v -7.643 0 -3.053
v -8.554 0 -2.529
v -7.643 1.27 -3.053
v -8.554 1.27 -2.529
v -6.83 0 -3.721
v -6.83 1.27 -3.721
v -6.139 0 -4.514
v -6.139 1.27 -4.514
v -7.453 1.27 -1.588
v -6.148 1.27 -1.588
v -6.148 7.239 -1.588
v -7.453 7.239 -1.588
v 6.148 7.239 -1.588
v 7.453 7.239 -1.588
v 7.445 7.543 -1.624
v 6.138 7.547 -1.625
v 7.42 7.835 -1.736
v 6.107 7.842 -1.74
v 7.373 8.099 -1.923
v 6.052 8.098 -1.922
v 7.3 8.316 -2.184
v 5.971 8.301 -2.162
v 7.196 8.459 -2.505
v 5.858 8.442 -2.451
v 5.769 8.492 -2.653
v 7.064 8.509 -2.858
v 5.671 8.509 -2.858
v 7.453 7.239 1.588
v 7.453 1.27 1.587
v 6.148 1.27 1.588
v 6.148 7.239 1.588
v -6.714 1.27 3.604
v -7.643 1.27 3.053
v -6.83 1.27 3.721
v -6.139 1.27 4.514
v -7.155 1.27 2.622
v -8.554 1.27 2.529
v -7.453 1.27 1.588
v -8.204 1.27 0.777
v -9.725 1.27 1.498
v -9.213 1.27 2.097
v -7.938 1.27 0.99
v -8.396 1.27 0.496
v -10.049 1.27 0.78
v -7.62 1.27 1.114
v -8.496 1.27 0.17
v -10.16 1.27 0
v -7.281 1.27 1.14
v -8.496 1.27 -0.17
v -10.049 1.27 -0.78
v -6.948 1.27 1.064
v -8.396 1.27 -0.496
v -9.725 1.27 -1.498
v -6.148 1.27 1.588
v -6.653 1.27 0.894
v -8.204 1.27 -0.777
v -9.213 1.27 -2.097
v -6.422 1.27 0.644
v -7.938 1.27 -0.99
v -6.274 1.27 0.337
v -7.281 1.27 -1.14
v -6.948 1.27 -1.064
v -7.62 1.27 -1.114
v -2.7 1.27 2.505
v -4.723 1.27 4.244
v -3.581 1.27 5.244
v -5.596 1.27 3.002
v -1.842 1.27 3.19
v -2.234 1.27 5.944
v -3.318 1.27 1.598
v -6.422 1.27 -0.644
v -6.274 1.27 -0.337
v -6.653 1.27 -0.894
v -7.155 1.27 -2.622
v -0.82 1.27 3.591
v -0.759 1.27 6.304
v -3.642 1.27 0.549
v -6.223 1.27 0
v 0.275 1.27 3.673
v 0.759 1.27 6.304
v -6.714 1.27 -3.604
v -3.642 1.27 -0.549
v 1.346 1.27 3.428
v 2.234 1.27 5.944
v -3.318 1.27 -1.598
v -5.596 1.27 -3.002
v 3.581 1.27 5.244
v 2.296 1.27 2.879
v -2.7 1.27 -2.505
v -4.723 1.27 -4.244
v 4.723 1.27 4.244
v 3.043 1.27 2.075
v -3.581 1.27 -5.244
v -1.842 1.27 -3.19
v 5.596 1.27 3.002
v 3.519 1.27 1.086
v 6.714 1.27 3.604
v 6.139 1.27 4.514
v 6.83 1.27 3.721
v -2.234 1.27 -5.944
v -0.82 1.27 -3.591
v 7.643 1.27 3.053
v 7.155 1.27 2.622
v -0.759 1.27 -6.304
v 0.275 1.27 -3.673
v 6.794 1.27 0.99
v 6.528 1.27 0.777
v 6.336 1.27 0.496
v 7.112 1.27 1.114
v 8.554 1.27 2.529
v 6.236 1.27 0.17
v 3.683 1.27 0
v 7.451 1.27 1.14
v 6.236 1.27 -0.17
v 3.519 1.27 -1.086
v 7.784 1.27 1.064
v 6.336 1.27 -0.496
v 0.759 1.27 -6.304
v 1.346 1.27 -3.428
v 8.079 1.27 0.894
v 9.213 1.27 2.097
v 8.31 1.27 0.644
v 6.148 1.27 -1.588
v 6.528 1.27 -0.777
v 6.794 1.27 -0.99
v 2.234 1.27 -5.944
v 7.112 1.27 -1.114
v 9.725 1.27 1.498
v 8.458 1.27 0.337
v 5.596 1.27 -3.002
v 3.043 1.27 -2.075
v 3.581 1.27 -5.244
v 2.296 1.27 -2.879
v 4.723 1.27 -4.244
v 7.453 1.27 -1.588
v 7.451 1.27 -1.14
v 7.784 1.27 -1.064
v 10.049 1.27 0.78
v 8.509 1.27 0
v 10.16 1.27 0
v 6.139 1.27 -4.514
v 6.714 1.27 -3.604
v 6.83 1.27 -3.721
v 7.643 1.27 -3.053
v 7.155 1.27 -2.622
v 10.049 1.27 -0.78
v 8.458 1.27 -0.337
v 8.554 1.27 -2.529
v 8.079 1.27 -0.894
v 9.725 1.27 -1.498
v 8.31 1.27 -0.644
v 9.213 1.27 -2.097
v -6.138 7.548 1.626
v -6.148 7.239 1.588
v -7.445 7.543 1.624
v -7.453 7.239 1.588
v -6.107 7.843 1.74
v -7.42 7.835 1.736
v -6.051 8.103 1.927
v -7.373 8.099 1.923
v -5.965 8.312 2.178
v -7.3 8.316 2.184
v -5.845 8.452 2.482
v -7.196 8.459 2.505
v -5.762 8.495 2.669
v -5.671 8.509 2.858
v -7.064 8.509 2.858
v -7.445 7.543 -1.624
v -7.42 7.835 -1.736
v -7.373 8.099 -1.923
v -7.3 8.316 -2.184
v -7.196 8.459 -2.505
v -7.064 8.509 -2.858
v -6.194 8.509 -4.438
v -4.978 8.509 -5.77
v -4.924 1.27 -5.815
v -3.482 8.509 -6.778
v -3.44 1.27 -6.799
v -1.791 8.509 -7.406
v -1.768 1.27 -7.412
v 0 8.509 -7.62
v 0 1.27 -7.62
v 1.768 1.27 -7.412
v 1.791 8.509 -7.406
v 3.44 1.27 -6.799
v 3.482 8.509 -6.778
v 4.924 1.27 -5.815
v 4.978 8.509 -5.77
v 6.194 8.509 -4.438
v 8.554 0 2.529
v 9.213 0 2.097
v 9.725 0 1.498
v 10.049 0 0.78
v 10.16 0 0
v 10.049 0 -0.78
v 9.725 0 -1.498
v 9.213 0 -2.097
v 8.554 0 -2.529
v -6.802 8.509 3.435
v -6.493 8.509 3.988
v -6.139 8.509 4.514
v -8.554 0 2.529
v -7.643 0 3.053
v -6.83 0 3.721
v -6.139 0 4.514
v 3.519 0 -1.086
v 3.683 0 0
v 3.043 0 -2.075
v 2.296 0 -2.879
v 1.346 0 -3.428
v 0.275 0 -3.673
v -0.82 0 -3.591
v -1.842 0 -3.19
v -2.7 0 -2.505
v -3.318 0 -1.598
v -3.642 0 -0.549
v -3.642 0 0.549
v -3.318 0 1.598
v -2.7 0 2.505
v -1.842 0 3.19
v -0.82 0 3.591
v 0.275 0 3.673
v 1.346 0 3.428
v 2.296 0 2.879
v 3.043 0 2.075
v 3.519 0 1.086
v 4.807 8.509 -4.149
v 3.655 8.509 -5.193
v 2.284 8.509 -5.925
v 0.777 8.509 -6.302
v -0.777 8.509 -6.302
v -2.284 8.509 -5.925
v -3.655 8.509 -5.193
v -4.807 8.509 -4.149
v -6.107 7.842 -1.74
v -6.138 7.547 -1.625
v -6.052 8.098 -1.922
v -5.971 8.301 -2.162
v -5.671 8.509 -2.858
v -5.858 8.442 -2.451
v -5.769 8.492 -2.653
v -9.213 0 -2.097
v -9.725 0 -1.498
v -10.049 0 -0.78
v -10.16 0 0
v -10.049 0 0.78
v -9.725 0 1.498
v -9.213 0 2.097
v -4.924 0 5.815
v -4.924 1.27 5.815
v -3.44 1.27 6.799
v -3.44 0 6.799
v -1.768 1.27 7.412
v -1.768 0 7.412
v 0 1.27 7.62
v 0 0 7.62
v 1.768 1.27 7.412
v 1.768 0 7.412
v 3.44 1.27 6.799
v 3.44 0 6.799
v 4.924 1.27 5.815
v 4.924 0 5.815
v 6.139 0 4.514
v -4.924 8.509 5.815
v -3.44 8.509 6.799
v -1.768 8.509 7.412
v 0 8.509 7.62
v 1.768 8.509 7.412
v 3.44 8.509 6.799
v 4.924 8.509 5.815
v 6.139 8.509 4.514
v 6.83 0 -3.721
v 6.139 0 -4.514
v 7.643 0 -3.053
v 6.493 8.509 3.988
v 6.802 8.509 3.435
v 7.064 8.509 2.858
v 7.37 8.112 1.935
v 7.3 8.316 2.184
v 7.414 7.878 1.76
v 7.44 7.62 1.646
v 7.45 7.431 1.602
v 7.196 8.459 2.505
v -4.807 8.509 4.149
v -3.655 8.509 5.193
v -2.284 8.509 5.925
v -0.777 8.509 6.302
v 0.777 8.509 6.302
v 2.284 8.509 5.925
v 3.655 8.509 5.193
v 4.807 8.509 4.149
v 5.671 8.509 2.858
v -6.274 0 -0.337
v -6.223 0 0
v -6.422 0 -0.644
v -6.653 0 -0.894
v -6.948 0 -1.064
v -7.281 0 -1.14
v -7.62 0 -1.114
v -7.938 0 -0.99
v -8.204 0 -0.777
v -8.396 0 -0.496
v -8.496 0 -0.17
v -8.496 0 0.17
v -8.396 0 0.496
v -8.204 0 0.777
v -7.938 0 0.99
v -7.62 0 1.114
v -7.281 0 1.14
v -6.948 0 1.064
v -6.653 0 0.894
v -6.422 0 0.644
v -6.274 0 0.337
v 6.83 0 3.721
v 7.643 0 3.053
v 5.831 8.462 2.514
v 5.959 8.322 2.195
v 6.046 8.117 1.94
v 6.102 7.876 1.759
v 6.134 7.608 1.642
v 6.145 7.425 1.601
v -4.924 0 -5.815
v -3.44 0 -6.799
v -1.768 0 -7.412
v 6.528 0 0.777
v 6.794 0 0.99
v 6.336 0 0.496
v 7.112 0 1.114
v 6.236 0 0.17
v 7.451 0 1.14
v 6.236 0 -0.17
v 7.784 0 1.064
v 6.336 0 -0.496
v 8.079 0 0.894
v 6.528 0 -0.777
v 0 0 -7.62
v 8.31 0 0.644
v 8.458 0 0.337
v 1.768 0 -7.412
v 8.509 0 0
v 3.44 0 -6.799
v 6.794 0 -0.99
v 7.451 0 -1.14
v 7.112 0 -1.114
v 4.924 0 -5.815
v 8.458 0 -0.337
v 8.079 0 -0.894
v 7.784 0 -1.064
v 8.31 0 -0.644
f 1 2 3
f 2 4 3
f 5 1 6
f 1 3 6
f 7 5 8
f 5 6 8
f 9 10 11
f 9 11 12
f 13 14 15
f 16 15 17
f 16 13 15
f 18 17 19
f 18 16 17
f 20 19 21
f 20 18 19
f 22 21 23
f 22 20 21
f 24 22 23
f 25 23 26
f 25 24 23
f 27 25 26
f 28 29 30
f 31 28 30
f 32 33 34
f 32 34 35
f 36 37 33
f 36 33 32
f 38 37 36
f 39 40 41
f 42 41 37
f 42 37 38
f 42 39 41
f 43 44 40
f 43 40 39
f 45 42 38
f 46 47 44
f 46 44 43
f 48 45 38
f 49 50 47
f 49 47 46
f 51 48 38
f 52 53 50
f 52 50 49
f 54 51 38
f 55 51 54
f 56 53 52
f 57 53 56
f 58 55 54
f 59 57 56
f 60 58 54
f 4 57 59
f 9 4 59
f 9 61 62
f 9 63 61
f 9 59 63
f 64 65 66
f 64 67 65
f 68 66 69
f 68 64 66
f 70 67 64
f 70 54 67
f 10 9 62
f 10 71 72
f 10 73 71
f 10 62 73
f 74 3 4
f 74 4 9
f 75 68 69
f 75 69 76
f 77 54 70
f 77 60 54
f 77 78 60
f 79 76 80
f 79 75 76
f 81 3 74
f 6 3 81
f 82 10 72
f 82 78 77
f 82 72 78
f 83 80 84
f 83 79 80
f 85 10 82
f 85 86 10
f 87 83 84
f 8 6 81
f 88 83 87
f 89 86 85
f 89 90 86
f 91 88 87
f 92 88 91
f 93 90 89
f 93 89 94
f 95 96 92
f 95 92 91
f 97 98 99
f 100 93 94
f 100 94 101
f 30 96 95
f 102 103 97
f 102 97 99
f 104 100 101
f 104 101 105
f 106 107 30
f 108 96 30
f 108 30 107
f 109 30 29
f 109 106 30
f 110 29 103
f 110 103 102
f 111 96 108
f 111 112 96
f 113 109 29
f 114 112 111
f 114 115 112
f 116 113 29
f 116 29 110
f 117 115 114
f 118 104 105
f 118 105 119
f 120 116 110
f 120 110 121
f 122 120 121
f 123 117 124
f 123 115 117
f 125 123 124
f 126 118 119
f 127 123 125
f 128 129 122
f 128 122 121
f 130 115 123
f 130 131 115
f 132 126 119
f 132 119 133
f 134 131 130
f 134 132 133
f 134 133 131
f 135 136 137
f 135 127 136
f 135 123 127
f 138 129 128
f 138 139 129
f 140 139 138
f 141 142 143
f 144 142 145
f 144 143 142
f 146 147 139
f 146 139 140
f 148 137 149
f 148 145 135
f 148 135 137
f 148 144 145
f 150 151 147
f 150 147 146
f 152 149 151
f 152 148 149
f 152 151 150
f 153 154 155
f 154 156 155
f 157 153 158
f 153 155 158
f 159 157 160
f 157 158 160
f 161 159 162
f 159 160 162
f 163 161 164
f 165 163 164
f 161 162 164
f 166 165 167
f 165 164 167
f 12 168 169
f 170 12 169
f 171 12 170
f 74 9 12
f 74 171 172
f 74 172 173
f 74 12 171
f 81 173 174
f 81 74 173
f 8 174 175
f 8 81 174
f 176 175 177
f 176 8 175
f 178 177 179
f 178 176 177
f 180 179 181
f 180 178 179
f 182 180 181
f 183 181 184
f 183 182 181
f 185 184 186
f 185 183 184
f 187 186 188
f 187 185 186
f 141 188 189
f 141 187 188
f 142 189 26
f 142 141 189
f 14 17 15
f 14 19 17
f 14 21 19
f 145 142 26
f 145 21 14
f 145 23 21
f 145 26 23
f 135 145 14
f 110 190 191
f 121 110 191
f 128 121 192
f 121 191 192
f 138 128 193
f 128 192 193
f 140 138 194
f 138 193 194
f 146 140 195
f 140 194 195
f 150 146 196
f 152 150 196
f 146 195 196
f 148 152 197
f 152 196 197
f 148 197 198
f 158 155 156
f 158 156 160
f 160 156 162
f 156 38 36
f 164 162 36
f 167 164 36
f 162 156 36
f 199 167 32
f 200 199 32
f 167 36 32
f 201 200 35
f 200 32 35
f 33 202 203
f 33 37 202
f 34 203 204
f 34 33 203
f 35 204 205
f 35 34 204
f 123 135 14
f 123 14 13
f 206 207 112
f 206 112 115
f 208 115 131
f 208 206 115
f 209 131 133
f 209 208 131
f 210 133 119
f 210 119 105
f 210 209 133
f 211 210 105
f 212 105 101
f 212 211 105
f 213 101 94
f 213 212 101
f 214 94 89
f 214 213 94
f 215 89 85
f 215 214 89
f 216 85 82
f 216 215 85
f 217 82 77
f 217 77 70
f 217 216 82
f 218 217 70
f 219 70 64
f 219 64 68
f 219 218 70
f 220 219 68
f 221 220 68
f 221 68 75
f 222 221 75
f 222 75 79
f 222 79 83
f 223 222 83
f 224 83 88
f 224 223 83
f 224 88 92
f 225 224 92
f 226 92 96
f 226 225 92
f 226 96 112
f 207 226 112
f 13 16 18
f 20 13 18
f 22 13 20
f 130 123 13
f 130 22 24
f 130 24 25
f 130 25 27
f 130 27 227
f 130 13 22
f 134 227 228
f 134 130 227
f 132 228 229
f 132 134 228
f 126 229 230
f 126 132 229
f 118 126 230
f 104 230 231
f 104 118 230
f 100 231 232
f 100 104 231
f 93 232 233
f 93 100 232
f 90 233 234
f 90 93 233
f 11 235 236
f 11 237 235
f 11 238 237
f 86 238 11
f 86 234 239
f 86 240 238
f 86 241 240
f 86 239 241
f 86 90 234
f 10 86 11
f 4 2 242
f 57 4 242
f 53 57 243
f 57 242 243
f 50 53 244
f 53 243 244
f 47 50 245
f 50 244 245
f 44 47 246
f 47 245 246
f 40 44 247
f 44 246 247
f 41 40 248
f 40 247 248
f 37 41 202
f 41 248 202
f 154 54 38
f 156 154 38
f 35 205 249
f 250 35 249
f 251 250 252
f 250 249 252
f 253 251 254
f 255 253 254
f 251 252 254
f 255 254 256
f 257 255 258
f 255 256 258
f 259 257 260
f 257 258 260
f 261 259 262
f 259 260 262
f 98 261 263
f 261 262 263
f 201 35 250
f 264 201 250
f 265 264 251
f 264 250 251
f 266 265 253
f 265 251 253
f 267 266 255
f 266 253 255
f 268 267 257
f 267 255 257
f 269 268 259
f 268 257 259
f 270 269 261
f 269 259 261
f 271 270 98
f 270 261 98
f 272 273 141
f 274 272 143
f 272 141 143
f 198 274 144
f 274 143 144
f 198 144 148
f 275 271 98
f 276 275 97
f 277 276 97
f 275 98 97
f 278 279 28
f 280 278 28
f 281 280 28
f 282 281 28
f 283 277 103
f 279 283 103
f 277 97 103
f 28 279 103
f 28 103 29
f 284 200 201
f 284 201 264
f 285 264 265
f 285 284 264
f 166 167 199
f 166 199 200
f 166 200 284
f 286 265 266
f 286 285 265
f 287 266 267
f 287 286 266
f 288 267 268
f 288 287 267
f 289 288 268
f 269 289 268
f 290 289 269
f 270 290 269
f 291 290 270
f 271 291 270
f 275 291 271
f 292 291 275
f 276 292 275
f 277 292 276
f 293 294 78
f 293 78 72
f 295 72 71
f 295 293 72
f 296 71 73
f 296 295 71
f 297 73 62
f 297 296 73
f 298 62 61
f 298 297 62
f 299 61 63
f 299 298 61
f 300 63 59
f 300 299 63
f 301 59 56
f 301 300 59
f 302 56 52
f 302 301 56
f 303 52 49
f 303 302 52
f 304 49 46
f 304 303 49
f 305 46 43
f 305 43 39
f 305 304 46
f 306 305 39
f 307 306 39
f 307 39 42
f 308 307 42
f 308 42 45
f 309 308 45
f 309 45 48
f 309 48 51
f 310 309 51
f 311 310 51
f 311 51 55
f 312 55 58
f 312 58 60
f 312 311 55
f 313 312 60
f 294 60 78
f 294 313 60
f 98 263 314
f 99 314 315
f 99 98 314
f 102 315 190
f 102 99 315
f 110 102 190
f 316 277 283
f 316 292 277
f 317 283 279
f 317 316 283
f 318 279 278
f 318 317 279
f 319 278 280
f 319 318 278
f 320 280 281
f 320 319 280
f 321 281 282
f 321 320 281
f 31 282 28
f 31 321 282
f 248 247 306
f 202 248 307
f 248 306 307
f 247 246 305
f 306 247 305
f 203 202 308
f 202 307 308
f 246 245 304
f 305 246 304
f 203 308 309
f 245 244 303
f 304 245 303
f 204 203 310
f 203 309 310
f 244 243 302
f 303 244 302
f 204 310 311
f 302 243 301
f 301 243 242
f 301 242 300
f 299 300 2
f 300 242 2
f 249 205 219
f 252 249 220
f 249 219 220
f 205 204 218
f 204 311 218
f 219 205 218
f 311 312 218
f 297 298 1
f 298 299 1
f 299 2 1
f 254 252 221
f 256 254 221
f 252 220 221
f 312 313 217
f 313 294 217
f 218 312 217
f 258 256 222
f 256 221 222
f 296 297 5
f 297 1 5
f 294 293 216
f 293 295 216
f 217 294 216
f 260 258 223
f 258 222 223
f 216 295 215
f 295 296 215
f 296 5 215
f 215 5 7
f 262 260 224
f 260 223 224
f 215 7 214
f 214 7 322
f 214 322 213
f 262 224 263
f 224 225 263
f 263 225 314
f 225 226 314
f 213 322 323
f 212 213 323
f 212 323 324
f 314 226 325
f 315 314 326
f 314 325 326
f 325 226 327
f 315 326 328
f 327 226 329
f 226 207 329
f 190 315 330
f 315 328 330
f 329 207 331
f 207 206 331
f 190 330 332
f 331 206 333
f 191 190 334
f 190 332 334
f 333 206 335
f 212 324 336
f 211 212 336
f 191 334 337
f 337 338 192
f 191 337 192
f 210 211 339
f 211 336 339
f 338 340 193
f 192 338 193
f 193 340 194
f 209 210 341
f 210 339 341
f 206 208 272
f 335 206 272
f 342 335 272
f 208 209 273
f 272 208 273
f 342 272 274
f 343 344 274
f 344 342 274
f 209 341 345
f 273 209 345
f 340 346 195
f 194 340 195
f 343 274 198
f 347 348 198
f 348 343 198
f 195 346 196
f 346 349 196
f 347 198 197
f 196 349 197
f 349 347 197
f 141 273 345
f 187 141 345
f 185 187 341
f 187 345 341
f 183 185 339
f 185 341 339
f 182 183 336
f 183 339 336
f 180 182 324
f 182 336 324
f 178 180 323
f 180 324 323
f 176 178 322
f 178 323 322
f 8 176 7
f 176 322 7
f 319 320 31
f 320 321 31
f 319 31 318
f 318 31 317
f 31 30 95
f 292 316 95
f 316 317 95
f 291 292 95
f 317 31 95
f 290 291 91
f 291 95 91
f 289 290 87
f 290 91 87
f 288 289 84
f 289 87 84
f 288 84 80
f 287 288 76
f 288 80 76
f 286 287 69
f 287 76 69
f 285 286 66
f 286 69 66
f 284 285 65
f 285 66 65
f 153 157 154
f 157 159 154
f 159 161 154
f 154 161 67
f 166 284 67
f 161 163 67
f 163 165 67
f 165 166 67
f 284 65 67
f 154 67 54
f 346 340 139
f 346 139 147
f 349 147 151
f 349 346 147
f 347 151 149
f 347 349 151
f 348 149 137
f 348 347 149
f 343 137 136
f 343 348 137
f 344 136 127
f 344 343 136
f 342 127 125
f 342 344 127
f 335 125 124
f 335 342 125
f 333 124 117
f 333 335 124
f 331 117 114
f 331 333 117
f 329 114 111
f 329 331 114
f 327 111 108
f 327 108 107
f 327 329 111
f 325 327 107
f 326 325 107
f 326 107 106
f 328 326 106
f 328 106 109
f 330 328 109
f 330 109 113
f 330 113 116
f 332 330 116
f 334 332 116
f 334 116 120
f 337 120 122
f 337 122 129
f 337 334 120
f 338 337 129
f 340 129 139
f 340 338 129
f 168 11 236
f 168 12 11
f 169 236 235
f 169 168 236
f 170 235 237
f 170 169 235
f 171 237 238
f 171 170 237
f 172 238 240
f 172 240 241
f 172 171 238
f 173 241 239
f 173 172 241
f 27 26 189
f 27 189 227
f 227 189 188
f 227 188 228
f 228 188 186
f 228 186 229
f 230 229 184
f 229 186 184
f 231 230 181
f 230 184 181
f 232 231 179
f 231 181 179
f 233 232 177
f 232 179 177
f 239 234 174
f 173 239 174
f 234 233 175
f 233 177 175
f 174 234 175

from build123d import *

# Parameters (mm, degrees)
SKETCH1_R           = 3.683
SKETCH1_R_2         = 1.143
BOSS_EXTRUDE1_DEPTH = 1.27
FILLET1_R           = 6.35
BOSS_EXTRUDE2_DEPTH = 7.239
FILLET2_R           = 1.27


with BuildPart() as part:
    # Sketch1 → Boss-Extrude1 (new body)
    with BuildSketch(Plane(origin=(0, 0, 0), x_dir=(1, 0, 0), z_dir=(0, 1, 0))):
        with BuildLine():
            ThreePointArc((-7.094482759, 2.780775861), (-10.16, 0), (-7.094482759, -2.780775861))
            ThreePointArc((-7.094482759, -2.780775861), (0, -7.62), (7.094482759, -2.780775861))
            ThreePointArc((7.094482759, -2.780775861), (10.16, 0), (7.094482759, 2.780775861))
            ThreePointArc((7.094482759, 2.780775861), (0, 7.62), (-7.094482759, 2.780775861))
        make_face()
        Circle(SKETCH1_R, mode=Mode.SUBTRACT)
        with Locations((7.366, 0)):
            Circle(SKETCH1_R_2, mode=Mode.SUBTRACT)
        with Locations((-7.366, 0)):
            Circle(SKETCH1_R_2, mode=Mode.SUBTRACT)
    extrude(amount=BOSS_EXTRUDE1_DEPTH)

    # Fillet1
    fillet1_edges = [part.edges().sort_by_distance(p)[0] for p in [
        (7.094482759, 0.635, -2.780775861),
        (-7.094482759, 0.635, -2.780775861),
        (-7.094482759, 0.635, 2.780775861),
        (7.094482759, 0.635, 2.780775861),
    ]]
    fillet(fillet1_edges, radius=FILLET1_R)

    # Sketch2 → Boss-Extrude2 (add)
    with BuildSketch(Plane(origin=(0, 1.27, 0), x_dir=(1, 0, 0), z_dir=(0, 1, 0))):
        with BuildLine():
            ThreePointArc((7.452801067, 1.5875), (0, 7.62), (-7.452801067, 1.5875))
            Line((-7.452801067, 1.5875), (-6.148361062, 1.5875))
            ThreePointArc((-6.148361062, 1.5875), (0, 6.35), (6.148361062, 1.5875))
            Line((6.148361062, 1.5875), (7.452801067, 1.5875))
        make_face()
        with BuildLine():
            Line((-6.148361062, -1.5875), (-7.452801067, -1.5875))
            ThreePointArc((-7.452801067, -1.5875), (0, -7.62), (7.452801067, -1.5875))
            Line((7.452801067, -1.5875), (6.148361062, -1.5875))
            ThreePointArc((6.148361062, -1.5875), (0, -6.35), (-6.148361062, -1.5875))
        make_face()
    extrude(amount=BOSS_EXTRUDE2_DEPTH)

    # Fillet2
    fillet2_edges = [part.edges().sort_by_distance(p)[0] for p in [
        (6.800581065, 8.509, -1.5875),
        (6.800581065, 8.509, 1.5875),
        (-6.800581065, 8.509, 1.5875),
        (-6.800581065, 8.509, -1.5875),
    ]]
    fillet(fillet2_edges, radius=FILLET2_R)


solid = part.part
